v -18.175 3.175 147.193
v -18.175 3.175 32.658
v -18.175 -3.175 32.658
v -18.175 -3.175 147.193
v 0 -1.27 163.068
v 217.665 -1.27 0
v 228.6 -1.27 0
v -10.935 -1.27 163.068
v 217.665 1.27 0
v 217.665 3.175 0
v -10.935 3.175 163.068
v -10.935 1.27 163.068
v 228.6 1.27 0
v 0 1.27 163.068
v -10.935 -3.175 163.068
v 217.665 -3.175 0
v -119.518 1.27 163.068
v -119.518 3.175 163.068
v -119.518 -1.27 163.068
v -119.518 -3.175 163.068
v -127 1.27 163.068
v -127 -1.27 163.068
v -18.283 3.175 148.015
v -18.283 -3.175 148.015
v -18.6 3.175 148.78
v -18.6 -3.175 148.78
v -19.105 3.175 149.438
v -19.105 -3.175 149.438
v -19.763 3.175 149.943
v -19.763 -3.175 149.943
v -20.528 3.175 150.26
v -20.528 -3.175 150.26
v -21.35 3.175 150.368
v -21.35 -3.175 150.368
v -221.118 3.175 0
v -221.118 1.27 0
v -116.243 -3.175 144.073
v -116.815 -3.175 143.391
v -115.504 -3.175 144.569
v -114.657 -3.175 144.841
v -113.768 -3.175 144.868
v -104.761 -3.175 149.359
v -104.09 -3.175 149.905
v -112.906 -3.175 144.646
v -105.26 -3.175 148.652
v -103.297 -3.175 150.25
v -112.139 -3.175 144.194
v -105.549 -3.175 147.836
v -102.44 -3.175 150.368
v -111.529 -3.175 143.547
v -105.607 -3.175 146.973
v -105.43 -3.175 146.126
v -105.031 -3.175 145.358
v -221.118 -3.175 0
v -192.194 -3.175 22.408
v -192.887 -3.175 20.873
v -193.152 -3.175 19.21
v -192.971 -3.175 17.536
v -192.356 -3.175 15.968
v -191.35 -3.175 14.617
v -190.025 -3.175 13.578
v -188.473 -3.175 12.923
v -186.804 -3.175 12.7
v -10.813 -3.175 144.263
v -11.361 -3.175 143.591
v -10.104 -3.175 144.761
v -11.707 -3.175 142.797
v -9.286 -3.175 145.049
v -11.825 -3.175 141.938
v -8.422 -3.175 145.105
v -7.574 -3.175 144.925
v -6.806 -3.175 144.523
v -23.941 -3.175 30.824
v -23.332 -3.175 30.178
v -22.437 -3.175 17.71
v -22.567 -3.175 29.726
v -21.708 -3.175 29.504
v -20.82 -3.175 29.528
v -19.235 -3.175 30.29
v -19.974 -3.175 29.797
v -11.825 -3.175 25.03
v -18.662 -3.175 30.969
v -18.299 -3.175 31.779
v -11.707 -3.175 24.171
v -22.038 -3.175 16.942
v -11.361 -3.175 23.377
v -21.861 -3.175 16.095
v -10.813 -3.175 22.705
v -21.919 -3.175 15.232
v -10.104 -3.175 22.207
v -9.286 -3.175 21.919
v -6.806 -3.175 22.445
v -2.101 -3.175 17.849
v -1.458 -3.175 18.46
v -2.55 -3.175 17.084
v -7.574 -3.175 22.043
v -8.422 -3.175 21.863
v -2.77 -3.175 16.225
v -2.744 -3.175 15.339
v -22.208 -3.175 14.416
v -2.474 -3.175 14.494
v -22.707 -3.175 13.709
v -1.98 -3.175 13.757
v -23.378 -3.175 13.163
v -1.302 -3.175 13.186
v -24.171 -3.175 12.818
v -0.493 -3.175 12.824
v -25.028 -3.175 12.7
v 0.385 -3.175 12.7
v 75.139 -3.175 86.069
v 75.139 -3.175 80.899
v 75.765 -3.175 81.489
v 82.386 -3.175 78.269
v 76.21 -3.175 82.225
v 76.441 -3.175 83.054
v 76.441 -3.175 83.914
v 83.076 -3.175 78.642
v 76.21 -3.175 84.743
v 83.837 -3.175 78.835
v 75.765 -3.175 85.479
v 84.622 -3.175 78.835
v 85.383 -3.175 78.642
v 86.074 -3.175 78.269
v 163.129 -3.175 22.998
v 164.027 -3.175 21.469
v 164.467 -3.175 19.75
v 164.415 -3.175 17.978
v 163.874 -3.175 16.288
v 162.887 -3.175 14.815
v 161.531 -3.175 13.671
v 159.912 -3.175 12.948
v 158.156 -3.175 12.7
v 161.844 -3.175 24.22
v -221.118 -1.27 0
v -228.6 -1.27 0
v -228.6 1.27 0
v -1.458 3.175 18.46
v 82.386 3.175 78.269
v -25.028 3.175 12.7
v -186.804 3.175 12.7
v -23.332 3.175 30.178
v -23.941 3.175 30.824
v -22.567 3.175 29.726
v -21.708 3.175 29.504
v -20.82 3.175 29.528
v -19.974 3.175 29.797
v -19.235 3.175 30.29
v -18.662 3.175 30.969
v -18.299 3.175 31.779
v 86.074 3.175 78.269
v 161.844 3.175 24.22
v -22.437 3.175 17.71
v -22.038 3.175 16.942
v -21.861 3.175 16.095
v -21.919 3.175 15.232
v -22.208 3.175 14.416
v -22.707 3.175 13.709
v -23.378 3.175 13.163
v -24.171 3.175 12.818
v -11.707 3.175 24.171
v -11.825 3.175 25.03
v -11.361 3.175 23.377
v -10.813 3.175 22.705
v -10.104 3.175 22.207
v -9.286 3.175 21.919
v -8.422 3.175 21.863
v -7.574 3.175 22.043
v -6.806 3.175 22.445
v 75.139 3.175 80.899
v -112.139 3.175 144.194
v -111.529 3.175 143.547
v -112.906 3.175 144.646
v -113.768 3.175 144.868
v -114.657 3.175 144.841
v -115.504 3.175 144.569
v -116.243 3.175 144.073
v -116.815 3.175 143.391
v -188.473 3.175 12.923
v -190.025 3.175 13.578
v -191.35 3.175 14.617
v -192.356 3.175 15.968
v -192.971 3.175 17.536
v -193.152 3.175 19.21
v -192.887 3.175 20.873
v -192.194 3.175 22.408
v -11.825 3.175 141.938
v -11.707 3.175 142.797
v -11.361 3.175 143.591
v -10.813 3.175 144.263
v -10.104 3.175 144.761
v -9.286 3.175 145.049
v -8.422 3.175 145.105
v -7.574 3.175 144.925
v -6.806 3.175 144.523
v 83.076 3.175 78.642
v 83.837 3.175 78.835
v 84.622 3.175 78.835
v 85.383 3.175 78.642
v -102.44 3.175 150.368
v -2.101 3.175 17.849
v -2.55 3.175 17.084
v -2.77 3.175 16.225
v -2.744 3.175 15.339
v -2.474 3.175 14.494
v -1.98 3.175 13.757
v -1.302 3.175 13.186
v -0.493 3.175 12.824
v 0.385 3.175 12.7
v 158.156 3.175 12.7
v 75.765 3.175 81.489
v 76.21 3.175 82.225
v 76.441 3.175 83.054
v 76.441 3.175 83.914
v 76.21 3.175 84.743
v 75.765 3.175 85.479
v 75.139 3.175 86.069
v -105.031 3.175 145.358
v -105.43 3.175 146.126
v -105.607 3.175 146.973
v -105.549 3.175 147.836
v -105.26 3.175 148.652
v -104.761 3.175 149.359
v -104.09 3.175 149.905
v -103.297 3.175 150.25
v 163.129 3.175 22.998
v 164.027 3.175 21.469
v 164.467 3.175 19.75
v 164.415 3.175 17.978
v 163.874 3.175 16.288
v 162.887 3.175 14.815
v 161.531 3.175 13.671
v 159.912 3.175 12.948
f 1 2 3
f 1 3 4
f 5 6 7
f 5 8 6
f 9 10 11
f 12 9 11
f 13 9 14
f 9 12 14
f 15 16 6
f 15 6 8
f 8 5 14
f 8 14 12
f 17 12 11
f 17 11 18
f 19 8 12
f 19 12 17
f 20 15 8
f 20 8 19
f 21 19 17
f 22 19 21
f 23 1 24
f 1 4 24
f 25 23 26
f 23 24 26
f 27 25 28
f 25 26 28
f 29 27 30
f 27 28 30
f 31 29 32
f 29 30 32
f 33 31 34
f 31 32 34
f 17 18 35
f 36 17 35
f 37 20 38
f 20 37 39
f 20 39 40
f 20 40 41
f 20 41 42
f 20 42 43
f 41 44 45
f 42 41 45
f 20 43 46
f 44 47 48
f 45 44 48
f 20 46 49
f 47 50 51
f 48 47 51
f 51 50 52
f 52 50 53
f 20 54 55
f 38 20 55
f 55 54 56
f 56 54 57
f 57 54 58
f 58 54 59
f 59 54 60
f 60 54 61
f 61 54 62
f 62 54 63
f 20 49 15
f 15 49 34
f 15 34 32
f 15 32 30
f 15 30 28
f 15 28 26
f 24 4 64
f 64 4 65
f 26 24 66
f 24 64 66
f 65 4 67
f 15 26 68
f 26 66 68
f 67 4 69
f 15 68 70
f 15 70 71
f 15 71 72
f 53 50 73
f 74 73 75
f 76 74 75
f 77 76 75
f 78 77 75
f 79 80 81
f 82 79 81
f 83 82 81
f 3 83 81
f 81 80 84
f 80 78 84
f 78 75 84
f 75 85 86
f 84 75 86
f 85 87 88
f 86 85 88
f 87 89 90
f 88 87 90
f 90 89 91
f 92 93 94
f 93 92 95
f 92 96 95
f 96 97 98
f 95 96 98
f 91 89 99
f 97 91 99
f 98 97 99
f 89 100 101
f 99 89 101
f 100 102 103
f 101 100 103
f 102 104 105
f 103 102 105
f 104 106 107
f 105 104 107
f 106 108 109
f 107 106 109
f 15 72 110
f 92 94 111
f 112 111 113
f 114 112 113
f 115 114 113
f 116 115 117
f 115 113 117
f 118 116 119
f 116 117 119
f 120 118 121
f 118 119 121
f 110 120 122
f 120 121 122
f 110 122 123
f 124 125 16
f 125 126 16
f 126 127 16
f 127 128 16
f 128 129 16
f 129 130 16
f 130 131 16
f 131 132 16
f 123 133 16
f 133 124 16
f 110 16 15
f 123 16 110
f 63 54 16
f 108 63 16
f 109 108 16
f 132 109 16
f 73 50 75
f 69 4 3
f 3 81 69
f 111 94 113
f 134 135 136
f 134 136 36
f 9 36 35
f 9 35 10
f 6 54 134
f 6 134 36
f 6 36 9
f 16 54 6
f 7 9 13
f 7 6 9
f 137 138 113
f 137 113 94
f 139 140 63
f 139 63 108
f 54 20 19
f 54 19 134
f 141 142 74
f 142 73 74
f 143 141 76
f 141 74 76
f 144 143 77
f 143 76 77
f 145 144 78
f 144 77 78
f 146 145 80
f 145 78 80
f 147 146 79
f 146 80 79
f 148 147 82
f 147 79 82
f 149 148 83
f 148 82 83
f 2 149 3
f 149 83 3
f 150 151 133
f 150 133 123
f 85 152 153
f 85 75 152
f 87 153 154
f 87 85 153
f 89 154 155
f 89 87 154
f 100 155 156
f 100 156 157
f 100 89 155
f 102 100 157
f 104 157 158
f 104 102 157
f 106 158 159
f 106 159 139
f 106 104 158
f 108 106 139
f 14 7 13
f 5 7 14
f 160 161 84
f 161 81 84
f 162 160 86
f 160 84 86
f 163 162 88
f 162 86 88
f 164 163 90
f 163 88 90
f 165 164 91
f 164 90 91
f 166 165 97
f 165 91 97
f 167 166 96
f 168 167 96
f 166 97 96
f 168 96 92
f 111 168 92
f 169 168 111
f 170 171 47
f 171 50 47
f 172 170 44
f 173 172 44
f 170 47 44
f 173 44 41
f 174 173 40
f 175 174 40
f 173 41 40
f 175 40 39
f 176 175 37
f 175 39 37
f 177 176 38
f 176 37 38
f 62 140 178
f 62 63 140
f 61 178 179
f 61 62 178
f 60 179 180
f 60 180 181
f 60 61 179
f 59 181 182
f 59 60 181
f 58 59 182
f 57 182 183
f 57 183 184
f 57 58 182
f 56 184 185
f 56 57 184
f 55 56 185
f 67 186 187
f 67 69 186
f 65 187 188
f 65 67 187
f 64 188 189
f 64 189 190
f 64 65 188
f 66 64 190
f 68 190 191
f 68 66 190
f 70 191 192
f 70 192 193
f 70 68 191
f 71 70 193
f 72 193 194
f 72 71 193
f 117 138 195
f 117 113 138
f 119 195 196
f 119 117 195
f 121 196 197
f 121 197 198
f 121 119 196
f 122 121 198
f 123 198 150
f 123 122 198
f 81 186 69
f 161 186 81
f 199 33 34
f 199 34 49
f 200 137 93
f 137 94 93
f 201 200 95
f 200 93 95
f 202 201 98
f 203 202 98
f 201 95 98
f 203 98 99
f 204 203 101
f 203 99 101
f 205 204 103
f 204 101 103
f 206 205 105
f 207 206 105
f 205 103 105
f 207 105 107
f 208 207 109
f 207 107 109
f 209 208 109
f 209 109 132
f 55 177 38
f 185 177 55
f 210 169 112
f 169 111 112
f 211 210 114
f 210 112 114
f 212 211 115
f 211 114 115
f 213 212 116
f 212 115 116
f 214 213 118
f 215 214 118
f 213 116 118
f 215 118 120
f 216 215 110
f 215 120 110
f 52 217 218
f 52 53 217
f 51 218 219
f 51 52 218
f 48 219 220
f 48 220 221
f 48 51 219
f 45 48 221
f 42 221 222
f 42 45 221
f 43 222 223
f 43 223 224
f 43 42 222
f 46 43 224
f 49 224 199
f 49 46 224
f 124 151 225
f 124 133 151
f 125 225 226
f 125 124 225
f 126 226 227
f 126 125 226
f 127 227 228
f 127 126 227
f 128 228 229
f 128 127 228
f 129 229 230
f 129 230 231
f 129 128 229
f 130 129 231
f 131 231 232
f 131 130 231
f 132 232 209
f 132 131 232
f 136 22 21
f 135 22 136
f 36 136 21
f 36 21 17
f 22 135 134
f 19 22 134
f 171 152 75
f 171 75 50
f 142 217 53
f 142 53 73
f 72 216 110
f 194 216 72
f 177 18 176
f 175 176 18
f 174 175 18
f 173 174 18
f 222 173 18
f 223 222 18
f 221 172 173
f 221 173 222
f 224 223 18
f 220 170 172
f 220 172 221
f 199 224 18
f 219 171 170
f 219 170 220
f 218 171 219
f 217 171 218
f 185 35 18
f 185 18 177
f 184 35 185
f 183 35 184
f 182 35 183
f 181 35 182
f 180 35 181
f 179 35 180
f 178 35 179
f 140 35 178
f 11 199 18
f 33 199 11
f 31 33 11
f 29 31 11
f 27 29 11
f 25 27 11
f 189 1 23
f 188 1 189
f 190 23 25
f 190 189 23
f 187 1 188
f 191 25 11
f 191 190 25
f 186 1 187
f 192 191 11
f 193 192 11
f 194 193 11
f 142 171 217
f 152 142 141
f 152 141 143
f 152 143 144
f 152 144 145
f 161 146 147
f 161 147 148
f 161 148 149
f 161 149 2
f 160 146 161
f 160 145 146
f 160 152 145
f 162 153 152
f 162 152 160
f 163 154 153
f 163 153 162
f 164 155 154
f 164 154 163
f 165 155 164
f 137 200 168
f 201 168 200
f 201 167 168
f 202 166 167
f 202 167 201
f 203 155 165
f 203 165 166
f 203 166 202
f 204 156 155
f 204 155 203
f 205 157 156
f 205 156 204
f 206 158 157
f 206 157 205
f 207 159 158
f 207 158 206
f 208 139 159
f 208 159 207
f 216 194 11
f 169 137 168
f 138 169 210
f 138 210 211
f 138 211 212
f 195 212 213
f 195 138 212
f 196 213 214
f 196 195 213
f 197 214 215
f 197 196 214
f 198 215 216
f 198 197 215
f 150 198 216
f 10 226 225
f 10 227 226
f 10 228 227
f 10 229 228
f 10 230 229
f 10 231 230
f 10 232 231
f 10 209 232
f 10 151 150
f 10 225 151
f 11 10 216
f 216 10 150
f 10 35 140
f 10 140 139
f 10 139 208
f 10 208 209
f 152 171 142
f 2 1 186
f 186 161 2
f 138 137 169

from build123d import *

# Parameters (mm, degrees)
BOSS_EXTRUDE1_DEPTH      = 3.175
BOSS_EXTRUDE1_DEPTH_BACK = 3.175
CUT_EXTRUDE1_DEPTH       = 1.905
CUT_EXTRUDE2_DEPTH       = 6.35
BOSS_EXTRUDE2_DEPTH      = 6.35
FILLET1_R                = 3.175
FILLET2_R                = 6.35


with BuildPart() as part:
    # CS path → Boss-Extrude1 (new, two sides: drawn at the far end of the back side and taken through both)
    with BuildSketch(Plane(origin=(0, 0, 0), x_dir=(1, 0, 0), z_dir=(0, 1, 0)).offset(-BOSS_EXTRUDE1_DEPTH_BACK)):
        Polygon((-228.6, 0), (228.6, 0), (0, -163.068), (-127, -163.068), align=None)
    extrude(amount=BOSS_EXTRUDE1_DEPTH + BOSS_EXTRUDE1_DEPTH_BACK)

    # Sketch1 → Cut-Extrude1 (cut)
    with BuildSketch(Plane(origin=(0, 3.175, 0), x_dir=(1, 0, 0), z_dir=(0, 1, 0))):
        Polygon((-228.6, 0), (-127, -163.068), (-119.518322882, -163.068), (-221.118322882, 0), align=None)
        Polygon((0, -163.068), (228.6, 0), (217.665386403, 0), (-10.934613597, -163.068), align=None)
    cut_extrude1 = extrude(amount=-CUT_EXTRUDE1_DEPTH, mode=Mode.SUBTRACT)

    # Mirror1: Cut-Extrude1 across plane
    add(cut_extrude1.mirror(Plane.ZX), mode=Mode.SUBTRACT)

    # Sketch2 → Cut-Extrude2 (cut)
    with BuildSketch(Plane(origin=(0, 3.175, 0), x_dir=(1, 0, 0), z_dir=(0, 1, 0))):
        Polygon((-198.24219606, -12.7), (177.99242089, -12.7), (-15.000102474, -150.368), (-112.467741232, -150.368), align=None)
    extrude(amount=-CUT_EXTRUDE2_DEPTH, mode=Mode.SUBTRACT)

    # Sketch3 → Boss-Extrude2 (add)
    with BuildSketch(Plane(origin=(0, 3.175, 0), x_dir=(1, 0, 0), z_dir=(0, 1, 0))):
        Polygon((-18.890288084, -12.7), (-114.288712294, -147.445341445), (-112.467741232, -150.368), (-108.577555622, -150.368), (-18.175102474, -22.679209355), (-18.175102474, -150.368), (-15.000102474, -150.368), (-11.825102474, -148.103166667), (-11.825102474, -18.864845516), (78.762505809, -83.484006092), (84.229812607, -79.583993908), (-9.532795675, -12.7), align=None)
    extrude(amount=-BOSS_EXTRUDE2_DEPTH)

    # Fillet1
    fillet1_edges = [part.edges().sort_by_distance(p)[0] for p in [
        (-18.175102474, 0, 150.368),
        (-18.175102474, 0, 22.679209355),
        (-108.577555622, 0, 150.368),
        (-114.288712294, 0, 147.445341445),
        (-18.890288084, 0, 12.7),
        (-9.532795675, 0, 12.7),
        (84.229812607, 0, 79.583993908),
        (78.762505809, 0, 83.484006092),
        (-11.825102474, 0, 18.864845516),
        (-11.825102474, 0, 148.103166667),
    ]]
    fillet(fillet1_edges, radius=FILLET1_R)

    # Fillet2
    fillet2_edges = [part.edges().sort_by_distance(p)[0] for p in [
        (-198.24219606, 0, 12.7),
        (177.99242089, 0, 12.7),
    ]]
    fillet(fillet2_edges, radius=FILLET2_R)


solid = part.part
